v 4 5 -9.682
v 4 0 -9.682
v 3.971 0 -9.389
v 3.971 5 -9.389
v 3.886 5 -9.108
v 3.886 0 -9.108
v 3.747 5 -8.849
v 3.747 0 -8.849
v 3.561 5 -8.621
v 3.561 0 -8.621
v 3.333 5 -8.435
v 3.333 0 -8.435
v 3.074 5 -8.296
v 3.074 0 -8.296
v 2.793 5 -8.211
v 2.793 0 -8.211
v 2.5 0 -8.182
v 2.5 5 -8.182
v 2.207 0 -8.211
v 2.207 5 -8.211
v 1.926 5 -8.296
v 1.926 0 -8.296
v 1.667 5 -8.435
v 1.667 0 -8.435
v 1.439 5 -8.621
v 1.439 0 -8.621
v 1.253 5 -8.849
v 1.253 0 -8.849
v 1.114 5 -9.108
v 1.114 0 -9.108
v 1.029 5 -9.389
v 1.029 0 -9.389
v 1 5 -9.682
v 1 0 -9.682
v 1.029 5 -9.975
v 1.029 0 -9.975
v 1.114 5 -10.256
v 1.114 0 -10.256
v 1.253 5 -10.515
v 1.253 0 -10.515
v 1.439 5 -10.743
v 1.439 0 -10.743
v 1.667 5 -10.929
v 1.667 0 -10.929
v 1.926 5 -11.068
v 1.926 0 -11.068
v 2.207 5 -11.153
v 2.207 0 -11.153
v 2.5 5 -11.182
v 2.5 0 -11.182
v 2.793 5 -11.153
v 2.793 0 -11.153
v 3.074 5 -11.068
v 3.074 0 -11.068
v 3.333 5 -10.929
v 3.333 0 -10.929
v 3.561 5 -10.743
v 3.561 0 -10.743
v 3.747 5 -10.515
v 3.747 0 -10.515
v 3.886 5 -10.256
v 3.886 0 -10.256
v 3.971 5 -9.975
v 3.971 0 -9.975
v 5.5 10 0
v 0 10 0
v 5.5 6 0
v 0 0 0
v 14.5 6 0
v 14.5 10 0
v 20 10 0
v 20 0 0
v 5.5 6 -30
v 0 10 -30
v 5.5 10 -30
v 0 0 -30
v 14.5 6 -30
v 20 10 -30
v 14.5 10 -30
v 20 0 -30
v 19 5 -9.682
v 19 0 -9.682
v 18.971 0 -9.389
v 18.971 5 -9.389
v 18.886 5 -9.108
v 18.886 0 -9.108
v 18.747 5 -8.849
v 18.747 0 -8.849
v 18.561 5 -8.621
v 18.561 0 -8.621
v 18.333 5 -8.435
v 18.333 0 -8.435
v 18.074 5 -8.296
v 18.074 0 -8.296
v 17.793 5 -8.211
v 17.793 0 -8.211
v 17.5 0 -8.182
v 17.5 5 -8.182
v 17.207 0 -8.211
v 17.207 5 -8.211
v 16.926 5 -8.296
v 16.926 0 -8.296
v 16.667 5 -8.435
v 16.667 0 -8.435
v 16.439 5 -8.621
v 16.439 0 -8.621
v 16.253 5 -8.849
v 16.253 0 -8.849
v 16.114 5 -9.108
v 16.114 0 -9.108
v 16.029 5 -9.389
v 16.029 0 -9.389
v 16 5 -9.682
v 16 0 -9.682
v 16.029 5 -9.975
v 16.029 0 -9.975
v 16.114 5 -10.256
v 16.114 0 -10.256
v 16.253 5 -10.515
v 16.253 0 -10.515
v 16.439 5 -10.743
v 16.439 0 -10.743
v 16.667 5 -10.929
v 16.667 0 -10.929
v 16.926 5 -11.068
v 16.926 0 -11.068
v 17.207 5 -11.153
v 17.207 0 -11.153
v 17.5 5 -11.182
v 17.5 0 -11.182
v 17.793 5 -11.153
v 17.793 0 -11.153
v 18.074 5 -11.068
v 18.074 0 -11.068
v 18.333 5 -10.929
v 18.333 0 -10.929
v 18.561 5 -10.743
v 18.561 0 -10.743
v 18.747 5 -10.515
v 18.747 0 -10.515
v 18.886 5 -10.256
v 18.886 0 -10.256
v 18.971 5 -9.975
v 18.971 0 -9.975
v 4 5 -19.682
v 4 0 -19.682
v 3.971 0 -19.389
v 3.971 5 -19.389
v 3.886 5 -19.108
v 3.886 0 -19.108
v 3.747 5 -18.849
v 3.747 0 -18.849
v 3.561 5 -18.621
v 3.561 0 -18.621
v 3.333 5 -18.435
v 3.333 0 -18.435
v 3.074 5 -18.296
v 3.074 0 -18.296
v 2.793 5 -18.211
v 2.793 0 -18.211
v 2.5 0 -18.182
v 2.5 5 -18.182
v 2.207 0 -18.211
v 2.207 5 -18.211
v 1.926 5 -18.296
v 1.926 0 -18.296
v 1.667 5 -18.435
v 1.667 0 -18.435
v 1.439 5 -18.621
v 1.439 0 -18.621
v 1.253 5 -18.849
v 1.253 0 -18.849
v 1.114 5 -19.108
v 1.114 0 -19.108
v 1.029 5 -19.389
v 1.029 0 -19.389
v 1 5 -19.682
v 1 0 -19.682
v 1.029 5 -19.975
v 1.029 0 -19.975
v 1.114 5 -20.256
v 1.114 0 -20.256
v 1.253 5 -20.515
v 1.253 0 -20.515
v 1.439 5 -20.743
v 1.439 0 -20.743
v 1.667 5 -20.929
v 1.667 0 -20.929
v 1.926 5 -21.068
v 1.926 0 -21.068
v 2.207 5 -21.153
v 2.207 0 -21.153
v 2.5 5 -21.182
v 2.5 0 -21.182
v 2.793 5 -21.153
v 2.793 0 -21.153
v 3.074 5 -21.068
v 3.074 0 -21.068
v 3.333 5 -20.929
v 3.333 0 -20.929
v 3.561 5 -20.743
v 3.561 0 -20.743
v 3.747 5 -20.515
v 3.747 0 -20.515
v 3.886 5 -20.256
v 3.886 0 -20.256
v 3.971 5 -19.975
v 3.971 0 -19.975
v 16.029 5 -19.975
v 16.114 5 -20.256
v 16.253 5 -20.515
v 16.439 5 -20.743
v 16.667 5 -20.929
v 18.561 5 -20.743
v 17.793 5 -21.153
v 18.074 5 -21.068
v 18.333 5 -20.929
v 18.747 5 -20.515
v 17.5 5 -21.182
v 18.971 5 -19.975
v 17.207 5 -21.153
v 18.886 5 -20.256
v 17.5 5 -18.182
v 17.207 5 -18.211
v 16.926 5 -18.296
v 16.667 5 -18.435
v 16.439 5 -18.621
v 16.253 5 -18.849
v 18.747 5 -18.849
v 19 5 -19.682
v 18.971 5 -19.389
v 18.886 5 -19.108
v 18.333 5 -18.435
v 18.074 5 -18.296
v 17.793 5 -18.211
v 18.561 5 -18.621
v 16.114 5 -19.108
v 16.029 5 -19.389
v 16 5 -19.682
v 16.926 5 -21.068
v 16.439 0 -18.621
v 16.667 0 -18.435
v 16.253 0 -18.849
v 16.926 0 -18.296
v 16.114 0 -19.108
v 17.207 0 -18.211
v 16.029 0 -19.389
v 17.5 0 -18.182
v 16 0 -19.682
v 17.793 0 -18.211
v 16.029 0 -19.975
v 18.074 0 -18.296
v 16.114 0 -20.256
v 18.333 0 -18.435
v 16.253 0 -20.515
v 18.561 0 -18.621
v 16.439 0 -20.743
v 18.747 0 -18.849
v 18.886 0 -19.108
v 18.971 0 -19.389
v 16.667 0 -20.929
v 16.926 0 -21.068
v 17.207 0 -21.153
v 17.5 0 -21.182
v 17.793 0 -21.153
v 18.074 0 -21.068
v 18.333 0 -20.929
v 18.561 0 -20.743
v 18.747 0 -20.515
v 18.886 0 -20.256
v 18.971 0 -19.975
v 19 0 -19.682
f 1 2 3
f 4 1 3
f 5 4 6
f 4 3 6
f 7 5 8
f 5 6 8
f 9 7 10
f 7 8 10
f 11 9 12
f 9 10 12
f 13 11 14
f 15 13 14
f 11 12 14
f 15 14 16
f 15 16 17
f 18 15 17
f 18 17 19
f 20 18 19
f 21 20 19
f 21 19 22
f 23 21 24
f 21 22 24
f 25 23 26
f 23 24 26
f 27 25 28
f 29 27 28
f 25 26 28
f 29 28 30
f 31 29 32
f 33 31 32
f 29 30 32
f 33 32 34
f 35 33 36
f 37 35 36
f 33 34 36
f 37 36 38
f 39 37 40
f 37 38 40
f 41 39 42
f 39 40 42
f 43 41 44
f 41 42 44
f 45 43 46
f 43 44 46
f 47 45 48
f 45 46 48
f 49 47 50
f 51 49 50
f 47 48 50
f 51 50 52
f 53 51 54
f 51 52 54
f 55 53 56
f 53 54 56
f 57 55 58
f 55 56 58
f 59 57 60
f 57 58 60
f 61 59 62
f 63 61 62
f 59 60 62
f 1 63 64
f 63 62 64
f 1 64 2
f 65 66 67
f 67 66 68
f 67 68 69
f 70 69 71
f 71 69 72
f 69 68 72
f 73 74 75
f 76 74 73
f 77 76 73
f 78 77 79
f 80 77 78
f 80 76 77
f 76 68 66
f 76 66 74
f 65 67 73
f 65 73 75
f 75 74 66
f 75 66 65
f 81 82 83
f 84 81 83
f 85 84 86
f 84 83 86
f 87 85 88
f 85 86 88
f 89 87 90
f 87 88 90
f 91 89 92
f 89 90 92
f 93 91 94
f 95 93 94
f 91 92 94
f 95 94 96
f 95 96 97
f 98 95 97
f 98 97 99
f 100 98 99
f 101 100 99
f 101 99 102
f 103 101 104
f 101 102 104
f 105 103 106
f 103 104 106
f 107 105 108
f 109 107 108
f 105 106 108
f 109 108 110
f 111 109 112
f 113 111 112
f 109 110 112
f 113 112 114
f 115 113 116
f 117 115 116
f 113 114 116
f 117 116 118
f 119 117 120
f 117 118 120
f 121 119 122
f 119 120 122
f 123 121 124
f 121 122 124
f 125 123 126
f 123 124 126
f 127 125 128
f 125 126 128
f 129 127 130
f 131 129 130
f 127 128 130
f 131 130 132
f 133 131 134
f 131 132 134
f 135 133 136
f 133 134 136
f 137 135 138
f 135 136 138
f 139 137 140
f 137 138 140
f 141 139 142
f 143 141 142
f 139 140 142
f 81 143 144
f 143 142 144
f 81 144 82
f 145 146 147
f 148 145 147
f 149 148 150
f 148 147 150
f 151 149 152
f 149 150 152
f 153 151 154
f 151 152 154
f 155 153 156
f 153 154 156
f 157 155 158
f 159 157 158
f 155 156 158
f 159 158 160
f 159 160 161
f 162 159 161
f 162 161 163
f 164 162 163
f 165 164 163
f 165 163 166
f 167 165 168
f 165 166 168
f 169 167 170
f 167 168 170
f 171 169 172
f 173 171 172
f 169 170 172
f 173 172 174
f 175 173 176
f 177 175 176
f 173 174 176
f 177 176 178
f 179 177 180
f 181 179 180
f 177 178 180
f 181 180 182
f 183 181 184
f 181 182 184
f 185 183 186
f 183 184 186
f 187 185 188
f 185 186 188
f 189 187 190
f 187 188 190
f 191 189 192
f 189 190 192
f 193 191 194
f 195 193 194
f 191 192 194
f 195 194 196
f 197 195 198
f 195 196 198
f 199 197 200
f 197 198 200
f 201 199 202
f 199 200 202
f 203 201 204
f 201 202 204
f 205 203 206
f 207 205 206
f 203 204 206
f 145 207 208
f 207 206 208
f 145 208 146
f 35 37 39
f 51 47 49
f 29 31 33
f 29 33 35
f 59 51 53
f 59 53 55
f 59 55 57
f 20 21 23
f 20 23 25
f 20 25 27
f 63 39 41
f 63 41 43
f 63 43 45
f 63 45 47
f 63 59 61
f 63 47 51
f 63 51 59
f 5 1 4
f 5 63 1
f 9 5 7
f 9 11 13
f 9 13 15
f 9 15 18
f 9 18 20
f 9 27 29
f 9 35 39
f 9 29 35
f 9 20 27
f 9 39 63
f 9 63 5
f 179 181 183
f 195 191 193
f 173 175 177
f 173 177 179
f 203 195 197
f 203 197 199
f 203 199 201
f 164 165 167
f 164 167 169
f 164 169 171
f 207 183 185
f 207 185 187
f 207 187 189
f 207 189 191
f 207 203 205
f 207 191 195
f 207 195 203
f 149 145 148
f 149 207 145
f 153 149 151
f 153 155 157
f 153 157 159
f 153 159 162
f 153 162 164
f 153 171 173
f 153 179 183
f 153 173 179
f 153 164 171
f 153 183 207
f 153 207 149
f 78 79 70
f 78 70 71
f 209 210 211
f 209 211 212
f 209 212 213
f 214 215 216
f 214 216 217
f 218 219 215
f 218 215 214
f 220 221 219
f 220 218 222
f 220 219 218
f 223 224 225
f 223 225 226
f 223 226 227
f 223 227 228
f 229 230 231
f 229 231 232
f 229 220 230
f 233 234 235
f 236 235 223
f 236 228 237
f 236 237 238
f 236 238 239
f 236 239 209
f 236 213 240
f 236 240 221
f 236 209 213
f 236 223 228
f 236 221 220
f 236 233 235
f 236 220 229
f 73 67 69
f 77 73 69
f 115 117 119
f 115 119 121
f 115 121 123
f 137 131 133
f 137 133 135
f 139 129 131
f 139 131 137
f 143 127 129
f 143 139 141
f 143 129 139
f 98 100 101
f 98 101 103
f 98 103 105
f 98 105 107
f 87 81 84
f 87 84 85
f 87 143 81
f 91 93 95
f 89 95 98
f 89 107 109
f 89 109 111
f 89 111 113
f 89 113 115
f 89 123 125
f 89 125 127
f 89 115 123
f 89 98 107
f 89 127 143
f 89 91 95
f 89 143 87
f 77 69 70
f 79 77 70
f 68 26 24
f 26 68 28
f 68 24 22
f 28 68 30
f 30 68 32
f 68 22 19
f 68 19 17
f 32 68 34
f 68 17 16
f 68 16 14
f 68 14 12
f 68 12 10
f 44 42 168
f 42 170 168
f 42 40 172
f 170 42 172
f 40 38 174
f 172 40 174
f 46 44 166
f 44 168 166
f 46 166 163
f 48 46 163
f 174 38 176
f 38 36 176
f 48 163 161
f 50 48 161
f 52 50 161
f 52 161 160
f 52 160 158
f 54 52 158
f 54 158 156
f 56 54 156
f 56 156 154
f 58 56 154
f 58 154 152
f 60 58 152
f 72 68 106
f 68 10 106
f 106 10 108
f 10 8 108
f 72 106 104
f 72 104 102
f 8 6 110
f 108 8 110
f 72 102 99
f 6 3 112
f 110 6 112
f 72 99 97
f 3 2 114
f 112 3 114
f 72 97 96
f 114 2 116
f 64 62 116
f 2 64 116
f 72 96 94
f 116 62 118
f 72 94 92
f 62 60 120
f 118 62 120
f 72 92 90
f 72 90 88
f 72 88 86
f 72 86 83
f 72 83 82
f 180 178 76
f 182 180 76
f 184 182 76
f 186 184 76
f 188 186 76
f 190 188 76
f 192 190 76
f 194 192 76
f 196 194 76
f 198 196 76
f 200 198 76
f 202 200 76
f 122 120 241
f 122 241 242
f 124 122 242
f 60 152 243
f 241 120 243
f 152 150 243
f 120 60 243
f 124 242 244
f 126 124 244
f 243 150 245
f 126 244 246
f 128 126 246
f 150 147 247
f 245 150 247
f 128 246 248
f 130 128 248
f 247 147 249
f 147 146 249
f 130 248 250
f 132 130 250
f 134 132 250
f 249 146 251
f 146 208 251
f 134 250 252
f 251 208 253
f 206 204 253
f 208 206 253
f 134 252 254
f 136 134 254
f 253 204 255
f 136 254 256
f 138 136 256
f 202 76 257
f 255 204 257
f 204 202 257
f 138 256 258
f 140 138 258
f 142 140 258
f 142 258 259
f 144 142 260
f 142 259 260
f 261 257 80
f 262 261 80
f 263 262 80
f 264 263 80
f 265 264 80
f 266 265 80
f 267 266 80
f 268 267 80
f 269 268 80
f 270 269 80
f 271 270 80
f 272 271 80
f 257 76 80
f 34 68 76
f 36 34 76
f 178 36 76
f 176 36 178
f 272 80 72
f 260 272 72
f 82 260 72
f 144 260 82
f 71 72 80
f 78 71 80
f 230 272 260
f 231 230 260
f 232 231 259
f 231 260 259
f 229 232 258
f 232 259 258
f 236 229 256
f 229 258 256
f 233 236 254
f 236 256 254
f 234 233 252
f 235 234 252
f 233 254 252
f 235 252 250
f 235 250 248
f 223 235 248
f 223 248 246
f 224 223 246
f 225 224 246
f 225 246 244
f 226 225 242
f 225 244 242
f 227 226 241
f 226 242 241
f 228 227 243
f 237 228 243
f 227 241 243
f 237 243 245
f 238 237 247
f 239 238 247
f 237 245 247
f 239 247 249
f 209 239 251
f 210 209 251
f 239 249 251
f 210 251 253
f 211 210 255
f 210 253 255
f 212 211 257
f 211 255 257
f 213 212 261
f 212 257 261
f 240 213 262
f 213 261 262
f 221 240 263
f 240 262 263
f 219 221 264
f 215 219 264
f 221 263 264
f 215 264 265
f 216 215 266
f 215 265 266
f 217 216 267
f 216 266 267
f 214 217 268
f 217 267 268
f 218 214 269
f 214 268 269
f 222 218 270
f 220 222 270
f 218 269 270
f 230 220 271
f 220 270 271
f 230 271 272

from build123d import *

# Parameters (mm, degrees)
SKETCH1_W           = 20
SKETCH1_H           = 30
BOSS_EXTRUDE1_DEPTH = 10
SKETCH2_W           = 9
SKETCH2_H           = 4
CUT_EXTRUDE1_DEPTH  = 31
SKETCH3_R           = 1.5
CUT_EXTRUDE2_DEPTH  = 5


with BuildPart() as part:
    # Sketch1 → Boss-Extrude1 (new body)
    with BuildSketch(Plane(origin=(0, 0, 0), x_dir=(1, 0, 0), z_dir=(0, 1, 0))):
        with Locations((10, 15)):
            Rectangle(SKETCH1_W, SKETCH1_H)
    extrude(amount=BOSS_EXTRUDE1_DEPTH)

    # Sketch2 → Cut-Extrude1 (cut, through all)
    with BuildSketch(Plane.XY):
        with Locations((10, 8)):
            Rectangle(SKETCH2_W, SKETCH2_H)
    extrude(amount=-CUT_EXTRUDE1_DEPTH, mode=Mode.SUBTRACT)

    # Sketch3 → Cut-Extrude2 (cut)
    with BuildSketch(Plane.XZ):
        with Locations((2.5, -19.682120583)):
            Circle(SKETCH3_R)
        with Locations((17.5, -19.682120583)):
            Circle(SKETCH3_R)
        with Locations((17.5, -9.682120583)):
            Circle(SKETCH3_R)
        with Locations((2.5, -9.682120583)):
            Circle(SKETCH3_R)
    extrude(amount=-CUT_EXTRUDE2_DEPTH, mode=Mode.SUBTRACT)


solid = part.part
